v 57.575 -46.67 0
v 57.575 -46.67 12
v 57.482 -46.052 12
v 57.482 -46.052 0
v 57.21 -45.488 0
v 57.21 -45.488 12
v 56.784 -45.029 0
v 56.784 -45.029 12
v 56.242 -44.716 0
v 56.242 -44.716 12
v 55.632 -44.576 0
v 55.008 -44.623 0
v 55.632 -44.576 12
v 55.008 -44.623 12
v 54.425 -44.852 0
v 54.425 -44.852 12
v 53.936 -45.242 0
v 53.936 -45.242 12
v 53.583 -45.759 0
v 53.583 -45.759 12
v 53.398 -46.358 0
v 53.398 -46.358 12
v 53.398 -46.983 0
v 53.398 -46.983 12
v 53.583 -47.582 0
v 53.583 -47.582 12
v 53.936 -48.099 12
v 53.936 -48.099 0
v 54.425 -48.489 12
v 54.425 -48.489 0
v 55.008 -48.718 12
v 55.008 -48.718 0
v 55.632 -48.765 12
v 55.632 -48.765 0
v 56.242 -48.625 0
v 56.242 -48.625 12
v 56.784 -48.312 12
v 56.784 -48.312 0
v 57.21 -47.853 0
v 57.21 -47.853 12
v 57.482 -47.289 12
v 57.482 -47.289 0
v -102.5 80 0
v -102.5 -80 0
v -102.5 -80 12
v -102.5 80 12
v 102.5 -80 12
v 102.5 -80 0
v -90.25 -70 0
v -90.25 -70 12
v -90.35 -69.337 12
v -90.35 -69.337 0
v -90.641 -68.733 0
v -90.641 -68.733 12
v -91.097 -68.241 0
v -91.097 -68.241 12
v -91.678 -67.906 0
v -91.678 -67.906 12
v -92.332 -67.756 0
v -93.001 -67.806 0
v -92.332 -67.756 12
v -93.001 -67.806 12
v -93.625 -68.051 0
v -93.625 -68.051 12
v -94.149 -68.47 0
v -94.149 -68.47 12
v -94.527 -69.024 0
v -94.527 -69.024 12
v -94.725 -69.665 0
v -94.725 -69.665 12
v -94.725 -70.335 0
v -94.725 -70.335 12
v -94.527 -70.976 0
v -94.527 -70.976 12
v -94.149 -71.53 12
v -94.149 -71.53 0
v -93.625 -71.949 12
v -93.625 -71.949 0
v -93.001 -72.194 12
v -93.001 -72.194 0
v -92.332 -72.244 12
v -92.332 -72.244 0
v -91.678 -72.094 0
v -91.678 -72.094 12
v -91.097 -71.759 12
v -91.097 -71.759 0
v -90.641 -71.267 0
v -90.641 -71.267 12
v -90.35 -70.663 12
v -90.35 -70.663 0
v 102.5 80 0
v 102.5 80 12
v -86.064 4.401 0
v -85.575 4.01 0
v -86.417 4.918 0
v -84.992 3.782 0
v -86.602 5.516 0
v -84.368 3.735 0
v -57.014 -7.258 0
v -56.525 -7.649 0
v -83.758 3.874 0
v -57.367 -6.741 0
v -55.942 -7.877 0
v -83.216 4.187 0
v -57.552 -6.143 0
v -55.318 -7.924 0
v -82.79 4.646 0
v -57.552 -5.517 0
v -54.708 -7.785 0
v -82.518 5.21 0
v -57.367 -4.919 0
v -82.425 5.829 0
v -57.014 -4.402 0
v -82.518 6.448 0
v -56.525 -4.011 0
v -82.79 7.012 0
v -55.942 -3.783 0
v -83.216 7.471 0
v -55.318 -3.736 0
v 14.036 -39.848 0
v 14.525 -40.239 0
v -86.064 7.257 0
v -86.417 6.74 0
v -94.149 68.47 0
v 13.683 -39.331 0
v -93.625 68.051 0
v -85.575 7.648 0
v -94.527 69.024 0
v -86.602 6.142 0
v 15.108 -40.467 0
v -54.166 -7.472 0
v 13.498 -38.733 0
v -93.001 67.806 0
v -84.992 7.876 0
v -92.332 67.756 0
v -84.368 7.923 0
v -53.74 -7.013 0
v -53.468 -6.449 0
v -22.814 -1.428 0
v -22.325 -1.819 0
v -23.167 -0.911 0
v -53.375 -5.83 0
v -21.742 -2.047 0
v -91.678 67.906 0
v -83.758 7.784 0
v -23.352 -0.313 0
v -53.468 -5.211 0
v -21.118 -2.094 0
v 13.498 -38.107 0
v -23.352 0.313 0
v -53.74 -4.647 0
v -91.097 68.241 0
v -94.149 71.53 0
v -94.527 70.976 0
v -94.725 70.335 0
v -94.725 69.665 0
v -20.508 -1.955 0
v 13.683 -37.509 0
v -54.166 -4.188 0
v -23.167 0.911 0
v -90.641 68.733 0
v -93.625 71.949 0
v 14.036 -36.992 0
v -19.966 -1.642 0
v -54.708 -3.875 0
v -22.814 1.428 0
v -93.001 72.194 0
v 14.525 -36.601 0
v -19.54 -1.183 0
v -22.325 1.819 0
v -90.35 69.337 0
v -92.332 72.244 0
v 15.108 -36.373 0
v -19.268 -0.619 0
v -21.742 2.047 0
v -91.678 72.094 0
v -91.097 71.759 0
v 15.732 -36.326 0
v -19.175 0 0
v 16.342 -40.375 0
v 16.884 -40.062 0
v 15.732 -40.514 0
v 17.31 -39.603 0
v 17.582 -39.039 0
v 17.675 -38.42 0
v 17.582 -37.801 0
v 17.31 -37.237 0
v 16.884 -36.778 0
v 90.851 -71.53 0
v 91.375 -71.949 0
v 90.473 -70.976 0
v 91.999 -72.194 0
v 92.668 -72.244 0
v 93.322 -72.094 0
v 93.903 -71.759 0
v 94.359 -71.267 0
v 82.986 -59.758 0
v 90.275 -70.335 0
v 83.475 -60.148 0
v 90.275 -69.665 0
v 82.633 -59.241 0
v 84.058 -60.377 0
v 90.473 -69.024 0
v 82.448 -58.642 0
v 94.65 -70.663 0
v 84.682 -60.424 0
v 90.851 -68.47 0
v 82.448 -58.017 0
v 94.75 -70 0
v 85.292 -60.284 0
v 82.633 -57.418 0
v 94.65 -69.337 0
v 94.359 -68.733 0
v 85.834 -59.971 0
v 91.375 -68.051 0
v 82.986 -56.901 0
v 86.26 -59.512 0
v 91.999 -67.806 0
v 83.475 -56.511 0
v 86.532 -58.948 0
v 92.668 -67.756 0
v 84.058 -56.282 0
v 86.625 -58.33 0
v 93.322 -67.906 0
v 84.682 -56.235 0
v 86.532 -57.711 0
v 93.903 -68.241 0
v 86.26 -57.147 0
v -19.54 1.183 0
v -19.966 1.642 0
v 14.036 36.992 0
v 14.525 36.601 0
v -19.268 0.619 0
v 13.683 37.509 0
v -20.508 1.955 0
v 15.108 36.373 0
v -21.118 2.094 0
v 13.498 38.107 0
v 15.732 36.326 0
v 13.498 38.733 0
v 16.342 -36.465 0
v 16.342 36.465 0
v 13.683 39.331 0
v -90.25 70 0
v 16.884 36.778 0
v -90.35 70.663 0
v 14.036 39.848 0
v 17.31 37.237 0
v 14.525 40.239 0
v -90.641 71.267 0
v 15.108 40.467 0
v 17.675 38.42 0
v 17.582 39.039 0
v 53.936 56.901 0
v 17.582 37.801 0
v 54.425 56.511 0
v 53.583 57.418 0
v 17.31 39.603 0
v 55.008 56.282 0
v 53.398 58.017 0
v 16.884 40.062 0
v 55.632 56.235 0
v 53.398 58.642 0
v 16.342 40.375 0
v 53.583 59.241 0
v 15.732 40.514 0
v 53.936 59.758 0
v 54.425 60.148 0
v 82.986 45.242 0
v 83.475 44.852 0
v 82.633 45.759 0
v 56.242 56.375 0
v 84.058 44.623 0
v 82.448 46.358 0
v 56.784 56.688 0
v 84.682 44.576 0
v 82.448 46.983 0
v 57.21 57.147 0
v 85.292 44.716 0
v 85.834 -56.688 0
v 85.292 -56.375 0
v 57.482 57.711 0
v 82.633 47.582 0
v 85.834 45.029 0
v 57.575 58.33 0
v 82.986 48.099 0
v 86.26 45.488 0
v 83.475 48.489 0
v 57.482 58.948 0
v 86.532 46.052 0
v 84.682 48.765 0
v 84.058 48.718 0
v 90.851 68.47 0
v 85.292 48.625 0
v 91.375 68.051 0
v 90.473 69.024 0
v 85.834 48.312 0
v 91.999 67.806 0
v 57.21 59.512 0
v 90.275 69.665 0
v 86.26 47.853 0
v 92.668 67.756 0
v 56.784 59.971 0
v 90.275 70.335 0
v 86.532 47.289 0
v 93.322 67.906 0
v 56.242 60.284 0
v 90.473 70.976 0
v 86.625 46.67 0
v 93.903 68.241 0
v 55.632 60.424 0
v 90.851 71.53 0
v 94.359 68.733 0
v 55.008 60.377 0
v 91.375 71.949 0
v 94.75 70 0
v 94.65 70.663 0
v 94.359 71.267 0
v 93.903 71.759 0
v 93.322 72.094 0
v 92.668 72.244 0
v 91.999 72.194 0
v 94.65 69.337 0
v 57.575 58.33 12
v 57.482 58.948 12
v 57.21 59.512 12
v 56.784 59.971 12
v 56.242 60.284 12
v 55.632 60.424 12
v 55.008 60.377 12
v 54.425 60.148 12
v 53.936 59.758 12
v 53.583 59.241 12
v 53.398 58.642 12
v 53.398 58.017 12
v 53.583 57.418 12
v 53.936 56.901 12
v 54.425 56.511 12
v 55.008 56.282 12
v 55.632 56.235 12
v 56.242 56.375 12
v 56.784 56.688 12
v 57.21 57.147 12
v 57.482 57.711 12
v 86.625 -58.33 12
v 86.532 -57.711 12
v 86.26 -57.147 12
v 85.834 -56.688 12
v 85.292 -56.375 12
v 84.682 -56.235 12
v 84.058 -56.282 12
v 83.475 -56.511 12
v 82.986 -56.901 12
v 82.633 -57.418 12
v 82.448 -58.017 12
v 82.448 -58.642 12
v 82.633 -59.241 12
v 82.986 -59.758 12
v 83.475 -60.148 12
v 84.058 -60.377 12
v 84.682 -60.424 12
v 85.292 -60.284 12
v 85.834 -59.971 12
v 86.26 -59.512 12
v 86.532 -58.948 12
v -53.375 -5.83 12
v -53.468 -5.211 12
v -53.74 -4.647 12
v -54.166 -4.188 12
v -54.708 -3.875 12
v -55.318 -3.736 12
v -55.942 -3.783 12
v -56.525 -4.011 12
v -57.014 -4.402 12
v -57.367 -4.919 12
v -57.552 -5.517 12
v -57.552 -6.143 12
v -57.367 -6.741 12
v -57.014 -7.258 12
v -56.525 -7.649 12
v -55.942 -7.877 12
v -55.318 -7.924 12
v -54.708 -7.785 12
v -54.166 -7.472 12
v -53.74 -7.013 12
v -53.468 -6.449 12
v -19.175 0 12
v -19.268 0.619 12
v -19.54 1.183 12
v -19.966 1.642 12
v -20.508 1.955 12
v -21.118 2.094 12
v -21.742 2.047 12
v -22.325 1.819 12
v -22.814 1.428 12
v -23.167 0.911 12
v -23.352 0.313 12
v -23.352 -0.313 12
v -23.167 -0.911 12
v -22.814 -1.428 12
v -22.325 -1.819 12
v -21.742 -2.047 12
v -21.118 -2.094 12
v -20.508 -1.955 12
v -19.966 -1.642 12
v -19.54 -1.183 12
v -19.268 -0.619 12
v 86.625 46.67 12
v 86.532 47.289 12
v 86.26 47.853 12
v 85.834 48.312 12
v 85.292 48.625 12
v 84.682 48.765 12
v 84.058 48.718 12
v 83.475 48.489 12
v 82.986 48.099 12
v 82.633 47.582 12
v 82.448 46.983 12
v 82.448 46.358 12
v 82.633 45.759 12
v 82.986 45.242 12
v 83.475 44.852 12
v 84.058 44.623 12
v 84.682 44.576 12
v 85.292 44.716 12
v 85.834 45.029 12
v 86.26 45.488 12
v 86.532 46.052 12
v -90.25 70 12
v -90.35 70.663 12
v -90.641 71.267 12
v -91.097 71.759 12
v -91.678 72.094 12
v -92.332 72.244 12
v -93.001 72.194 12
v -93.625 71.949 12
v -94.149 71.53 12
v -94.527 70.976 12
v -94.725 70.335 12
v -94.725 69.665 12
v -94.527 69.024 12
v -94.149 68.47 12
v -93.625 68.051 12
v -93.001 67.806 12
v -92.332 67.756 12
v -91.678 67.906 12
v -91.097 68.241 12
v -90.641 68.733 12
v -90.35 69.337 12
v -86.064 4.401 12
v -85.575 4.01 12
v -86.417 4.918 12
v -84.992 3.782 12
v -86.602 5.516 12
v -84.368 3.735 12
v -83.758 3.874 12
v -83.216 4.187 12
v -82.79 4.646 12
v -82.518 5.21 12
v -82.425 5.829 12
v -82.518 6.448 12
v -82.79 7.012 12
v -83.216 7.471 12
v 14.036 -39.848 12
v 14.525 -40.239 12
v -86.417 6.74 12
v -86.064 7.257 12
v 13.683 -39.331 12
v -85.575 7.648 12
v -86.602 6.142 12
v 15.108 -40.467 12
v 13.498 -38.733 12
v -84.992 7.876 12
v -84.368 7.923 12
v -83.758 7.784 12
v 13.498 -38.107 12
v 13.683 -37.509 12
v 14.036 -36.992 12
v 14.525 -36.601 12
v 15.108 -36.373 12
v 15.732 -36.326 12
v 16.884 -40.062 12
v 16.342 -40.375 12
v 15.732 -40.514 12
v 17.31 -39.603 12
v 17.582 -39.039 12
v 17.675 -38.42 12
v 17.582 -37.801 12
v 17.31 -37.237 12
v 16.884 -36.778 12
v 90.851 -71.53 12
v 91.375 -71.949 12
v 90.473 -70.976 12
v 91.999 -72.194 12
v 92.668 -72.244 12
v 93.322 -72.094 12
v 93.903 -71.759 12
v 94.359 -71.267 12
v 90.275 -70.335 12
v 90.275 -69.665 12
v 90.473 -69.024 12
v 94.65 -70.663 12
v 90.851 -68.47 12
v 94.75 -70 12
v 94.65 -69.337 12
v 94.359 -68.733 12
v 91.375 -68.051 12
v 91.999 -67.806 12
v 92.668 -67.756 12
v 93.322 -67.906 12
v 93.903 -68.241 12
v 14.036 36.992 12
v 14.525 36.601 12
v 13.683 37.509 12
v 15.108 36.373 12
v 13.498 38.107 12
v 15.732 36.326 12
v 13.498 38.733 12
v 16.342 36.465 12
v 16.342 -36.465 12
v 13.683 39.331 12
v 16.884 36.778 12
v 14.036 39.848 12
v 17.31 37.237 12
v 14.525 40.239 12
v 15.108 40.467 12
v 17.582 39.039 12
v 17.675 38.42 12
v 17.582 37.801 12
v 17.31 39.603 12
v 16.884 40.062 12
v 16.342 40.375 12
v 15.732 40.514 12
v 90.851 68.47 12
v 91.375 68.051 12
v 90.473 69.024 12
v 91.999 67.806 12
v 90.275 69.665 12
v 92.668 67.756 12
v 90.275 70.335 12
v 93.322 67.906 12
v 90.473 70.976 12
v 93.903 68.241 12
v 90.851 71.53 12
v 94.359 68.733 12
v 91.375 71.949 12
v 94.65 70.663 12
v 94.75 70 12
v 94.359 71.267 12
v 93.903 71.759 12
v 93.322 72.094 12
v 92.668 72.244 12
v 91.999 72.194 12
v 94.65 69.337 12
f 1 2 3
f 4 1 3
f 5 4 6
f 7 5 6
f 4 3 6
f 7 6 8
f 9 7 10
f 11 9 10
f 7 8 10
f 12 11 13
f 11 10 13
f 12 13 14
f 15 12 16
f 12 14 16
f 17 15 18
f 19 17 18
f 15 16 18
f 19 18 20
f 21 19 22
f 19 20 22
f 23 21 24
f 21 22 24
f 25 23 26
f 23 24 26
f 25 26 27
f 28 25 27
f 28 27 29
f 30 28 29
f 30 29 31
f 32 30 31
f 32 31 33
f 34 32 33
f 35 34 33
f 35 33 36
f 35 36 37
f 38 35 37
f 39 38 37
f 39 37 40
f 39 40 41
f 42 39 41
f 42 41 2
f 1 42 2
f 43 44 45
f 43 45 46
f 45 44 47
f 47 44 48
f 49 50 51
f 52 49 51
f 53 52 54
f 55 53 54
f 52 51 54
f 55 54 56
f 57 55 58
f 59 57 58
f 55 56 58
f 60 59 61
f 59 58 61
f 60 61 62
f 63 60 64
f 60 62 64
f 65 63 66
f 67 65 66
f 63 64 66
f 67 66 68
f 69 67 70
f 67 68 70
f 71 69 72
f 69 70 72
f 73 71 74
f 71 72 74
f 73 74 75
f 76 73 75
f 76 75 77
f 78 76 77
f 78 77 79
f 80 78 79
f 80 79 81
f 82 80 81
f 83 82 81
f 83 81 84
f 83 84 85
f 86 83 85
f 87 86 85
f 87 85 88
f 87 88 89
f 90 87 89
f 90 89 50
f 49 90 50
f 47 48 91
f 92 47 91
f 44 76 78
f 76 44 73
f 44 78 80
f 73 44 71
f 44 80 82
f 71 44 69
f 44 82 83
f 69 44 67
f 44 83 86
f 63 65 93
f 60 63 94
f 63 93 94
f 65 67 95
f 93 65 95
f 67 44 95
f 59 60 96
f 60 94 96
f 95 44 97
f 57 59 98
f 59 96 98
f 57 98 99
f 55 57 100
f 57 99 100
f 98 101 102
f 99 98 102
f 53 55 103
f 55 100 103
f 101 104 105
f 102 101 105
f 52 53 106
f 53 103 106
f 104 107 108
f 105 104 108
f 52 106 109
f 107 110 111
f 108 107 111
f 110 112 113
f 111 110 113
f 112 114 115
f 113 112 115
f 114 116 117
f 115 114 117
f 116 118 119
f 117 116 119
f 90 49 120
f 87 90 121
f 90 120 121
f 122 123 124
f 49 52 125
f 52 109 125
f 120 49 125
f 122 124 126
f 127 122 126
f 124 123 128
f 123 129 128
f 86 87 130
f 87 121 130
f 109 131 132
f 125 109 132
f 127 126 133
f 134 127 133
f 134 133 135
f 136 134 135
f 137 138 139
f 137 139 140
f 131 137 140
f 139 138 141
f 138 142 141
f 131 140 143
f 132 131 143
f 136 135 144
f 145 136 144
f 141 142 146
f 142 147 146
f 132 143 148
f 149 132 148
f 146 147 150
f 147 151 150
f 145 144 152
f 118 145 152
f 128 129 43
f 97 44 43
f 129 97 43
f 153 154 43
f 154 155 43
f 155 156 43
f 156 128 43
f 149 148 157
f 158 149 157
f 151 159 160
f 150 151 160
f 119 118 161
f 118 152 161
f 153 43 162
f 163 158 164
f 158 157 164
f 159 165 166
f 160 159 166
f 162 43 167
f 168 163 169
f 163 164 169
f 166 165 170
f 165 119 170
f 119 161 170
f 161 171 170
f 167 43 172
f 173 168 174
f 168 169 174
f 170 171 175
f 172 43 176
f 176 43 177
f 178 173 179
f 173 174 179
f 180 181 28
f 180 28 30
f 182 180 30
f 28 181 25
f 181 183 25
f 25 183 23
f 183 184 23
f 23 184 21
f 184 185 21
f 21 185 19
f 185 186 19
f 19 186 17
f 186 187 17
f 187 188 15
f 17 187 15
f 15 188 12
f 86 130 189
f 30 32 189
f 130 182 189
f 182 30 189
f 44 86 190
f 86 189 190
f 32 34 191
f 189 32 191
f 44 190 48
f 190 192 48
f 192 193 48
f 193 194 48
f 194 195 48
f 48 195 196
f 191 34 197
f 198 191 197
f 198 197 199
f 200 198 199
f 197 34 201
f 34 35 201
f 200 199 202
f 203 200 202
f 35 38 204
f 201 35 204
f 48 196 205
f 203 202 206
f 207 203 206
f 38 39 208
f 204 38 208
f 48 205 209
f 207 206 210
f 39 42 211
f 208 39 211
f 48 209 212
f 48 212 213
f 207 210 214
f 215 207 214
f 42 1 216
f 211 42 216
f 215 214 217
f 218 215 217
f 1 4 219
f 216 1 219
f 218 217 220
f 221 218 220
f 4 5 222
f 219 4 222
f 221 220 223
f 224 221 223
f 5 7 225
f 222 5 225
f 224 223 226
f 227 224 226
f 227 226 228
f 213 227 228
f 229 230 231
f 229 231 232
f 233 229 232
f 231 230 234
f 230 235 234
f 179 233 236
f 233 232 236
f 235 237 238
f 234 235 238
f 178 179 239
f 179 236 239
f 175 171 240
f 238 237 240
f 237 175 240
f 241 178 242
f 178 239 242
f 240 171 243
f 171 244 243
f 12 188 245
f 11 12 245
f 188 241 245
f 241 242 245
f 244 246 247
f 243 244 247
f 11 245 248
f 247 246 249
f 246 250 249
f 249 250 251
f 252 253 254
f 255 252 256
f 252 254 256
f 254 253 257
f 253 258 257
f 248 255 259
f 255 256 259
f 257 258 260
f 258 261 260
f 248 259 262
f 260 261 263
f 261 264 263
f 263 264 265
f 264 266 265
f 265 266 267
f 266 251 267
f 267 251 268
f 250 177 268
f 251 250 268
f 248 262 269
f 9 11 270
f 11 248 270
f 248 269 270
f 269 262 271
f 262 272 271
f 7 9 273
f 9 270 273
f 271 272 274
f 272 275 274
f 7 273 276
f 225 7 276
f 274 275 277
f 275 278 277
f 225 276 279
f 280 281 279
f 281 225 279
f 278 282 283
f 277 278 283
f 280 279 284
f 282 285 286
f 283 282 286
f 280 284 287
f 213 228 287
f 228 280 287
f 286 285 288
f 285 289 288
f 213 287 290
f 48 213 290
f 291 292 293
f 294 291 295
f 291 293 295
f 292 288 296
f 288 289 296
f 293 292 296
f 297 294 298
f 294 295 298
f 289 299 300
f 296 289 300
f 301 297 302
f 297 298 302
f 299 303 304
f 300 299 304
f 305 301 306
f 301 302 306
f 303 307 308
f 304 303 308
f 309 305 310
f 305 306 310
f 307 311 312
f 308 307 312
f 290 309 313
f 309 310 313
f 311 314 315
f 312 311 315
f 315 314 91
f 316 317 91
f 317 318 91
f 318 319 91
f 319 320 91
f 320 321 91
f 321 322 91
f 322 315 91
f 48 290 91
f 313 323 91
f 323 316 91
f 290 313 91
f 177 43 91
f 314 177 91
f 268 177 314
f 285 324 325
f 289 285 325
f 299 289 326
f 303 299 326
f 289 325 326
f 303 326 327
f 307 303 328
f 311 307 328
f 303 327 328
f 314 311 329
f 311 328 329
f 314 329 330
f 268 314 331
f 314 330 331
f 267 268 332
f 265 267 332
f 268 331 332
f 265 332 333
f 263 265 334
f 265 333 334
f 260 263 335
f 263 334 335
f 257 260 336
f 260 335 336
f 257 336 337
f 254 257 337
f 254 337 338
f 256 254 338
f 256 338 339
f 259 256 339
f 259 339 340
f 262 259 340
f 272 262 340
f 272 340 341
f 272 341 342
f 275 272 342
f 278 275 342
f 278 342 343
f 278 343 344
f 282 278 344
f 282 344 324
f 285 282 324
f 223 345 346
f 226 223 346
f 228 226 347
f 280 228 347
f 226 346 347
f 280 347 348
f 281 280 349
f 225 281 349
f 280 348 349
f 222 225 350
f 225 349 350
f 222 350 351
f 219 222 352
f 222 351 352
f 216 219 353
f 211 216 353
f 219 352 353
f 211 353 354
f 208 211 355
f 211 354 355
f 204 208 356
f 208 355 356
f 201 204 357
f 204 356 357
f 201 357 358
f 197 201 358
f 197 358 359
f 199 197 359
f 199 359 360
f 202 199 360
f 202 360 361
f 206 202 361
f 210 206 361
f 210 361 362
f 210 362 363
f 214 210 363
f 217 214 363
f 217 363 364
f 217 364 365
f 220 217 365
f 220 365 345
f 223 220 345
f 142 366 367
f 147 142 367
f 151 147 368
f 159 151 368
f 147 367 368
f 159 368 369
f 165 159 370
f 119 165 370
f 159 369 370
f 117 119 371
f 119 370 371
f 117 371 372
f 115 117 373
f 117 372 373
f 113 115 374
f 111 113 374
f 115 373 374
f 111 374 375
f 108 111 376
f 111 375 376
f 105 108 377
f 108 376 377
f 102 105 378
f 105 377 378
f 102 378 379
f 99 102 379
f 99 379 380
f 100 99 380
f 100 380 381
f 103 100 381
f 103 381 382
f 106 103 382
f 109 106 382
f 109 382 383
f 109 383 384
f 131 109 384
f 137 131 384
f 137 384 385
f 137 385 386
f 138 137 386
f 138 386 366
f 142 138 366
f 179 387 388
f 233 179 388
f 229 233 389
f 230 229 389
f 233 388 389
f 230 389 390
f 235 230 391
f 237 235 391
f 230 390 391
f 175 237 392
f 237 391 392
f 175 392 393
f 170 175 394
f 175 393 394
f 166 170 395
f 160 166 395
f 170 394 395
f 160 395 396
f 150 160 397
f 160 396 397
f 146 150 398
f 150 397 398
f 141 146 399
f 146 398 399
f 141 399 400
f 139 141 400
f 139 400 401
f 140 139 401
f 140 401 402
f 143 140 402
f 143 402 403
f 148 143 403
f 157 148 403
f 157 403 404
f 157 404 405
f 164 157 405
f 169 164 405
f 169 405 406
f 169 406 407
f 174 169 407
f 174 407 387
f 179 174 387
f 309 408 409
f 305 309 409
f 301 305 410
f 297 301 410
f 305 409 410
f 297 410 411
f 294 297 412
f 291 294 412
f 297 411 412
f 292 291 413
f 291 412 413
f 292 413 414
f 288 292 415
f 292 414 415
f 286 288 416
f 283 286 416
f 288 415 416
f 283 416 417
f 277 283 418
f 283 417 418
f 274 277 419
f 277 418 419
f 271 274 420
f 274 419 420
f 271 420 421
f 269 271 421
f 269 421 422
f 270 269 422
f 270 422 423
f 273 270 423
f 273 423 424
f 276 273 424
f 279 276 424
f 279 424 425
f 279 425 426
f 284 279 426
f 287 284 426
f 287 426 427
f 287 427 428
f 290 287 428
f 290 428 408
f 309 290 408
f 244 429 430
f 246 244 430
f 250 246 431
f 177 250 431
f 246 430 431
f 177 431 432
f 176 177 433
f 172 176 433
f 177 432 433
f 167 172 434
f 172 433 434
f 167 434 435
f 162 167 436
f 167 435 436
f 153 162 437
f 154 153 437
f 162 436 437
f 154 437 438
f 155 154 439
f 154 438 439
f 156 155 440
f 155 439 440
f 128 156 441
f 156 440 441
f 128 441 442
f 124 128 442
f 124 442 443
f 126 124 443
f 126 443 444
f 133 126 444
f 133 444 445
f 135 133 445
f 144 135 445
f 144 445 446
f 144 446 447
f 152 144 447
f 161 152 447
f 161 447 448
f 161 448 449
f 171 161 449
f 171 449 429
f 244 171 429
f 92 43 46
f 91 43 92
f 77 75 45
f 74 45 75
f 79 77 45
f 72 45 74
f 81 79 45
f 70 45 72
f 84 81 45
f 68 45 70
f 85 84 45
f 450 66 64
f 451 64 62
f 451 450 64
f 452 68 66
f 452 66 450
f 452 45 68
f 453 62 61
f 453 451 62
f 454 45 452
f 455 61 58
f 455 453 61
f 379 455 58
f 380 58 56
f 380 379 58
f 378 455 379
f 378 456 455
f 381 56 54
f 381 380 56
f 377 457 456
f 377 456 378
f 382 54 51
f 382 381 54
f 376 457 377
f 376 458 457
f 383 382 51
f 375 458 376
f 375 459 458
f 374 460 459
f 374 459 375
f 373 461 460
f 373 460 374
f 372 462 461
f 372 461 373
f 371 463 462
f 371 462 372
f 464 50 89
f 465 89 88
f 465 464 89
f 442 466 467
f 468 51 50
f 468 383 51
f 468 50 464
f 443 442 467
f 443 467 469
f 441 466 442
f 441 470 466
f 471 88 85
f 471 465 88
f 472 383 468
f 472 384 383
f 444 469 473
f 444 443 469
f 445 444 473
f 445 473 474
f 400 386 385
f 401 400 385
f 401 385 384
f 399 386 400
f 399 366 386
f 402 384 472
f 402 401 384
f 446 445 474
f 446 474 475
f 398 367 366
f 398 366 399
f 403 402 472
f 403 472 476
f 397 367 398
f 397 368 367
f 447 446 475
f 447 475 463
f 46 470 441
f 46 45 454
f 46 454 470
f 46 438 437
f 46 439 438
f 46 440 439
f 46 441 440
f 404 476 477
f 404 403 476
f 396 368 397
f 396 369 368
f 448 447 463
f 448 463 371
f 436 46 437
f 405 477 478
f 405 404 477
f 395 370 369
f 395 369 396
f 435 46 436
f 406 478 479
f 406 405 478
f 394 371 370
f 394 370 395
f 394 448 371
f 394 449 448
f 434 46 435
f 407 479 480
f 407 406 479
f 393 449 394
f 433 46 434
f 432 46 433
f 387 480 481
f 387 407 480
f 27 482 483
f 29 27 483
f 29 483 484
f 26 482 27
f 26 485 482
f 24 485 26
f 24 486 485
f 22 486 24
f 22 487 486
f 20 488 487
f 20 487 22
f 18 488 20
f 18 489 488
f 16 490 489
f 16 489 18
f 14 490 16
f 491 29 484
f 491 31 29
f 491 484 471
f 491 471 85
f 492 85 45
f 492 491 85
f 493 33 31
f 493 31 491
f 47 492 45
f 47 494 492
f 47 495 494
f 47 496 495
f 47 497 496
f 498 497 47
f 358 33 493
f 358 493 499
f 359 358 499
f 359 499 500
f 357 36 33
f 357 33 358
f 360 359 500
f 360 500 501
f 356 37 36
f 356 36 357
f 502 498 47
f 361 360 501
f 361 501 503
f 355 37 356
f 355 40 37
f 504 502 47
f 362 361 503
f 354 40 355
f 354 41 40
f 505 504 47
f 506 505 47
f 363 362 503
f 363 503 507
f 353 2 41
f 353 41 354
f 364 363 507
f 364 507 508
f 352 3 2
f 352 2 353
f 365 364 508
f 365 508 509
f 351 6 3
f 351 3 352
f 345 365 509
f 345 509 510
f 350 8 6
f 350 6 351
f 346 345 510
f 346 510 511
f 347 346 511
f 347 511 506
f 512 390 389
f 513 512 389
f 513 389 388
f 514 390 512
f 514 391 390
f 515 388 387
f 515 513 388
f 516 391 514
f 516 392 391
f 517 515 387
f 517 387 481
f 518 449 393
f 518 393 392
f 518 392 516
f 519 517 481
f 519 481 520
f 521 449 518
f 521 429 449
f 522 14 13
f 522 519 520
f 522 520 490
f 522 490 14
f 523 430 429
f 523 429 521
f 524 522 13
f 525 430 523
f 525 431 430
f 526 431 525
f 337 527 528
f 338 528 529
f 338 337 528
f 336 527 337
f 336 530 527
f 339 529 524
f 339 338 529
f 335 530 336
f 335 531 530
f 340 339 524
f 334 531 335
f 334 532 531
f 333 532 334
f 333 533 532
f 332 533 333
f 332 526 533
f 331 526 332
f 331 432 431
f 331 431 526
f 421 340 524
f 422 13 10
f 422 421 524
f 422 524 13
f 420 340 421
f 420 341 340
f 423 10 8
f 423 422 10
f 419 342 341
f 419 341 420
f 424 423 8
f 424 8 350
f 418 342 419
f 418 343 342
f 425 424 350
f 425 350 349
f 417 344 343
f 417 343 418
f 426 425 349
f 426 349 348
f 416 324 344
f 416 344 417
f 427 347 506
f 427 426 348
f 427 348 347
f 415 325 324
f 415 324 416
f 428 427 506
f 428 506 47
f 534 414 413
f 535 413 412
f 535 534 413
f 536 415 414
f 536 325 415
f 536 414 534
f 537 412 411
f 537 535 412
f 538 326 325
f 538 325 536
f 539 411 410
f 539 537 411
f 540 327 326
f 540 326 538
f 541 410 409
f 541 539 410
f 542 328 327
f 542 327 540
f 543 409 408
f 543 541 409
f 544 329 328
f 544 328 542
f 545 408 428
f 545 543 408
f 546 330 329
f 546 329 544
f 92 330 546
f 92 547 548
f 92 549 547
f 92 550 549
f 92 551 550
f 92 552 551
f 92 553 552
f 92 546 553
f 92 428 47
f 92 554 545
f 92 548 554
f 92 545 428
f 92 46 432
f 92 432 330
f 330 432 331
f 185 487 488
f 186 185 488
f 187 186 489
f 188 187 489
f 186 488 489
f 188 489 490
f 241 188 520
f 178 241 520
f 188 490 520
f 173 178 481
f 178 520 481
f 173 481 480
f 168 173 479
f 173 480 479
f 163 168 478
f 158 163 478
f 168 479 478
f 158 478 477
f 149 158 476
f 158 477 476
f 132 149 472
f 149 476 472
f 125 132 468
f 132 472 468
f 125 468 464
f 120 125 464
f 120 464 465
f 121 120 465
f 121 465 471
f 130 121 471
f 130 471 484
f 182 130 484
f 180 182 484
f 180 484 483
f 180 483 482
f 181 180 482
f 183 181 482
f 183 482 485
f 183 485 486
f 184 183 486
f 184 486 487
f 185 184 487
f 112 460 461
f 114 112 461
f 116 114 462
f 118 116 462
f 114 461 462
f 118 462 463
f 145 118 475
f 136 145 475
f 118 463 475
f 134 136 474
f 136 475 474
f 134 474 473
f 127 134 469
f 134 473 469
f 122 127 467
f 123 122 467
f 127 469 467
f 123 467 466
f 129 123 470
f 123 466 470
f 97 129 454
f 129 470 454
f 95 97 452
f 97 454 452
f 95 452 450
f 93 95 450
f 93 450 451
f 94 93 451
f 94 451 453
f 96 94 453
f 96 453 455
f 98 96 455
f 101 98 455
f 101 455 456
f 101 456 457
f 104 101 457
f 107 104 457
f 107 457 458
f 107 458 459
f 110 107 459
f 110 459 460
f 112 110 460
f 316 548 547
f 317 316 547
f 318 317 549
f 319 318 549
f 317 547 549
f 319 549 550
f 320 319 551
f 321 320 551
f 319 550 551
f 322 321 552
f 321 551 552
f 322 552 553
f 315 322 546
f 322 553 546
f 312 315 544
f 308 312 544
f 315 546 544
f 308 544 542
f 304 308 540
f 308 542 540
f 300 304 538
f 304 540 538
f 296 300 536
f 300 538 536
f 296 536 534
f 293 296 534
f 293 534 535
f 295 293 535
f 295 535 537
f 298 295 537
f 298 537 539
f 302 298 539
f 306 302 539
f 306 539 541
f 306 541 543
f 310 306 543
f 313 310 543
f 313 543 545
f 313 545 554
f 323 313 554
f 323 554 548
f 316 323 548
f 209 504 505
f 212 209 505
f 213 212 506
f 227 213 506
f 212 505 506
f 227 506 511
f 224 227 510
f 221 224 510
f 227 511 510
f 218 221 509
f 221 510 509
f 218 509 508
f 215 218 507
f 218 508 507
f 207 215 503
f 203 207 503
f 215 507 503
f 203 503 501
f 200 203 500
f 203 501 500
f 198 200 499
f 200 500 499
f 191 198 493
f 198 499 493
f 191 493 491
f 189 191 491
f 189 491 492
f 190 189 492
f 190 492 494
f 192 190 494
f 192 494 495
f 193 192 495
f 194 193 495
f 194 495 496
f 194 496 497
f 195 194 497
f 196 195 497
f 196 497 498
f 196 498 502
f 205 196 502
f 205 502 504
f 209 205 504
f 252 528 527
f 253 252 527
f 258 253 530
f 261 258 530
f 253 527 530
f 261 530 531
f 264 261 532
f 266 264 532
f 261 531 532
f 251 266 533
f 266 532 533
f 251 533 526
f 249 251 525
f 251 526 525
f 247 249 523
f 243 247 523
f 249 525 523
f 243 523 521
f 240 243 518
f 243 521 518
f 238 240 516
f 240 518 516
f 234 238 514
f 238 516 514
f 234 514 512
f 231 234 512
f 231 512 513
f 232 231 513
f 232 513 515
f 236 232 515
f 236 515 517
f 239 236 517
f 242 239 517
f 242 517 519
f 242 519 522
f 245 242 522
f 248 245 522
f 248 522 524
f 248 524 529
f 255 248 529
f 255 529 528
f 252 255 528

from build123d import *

# Parameters (mm, degrees)
SKETCH_W        = 205
SKETCH_H        = 160
PAD_DEPTH       = 12
SKETCH001_R     = 2.1
POCKET_DEPTH    = 12.001
SKETCH002_R     = 2.25
POCKET001_DEPTH = 12.001


with BuildPart() as part:
    # Sketch → Pad (new body)
    with BuildSketch(Plane.XY):
        Rectangle(SKETCH_W, SKETCH_H)
    extrude(amount=PAD_DEPTH)

    # Sketch001 → Pocket (cut, through all)
    with BuildSketch(Plane.XY.offset(12)):
        with Locations((-84.525, 5.829)):
            Circle(SKETCH001_R)
        with Locations((-55.475, -5.83)):
            Circle(SKETCH001_R)
        with Locations((-21.275, 0)):
            Circle(SKETCH001_R)
        with Locations((15.575, 38.42)):
            Circle(SKETCH001_R)
        with Locations((15.575, -38.42)):
            Circle(SKETCH001_R)
        with Locations((55.475, 58.3295)):
            Circle(SKETCH001_R)
        with Locations((84.525, 46.6705)):
            Circle(SKETCH001_R)
        with Locations((55.475, -46.6705)):
            Circle(SKETCH001_R)
        with Locations((84.525, -58.3295)):
            Circle(SKETCH001_R)
    extrude(amount=-POCKET_DEPTH, mode=Mode.SUBTRACT)

    # Sketch002 → Pocket001 (cut, through all)
    with BuildSketch(Plane.XY.offset(12)):
        with Locations((-92.5, 70)):
            Circle(SKETCH002_R)
        with Locations((92.5, 70)):
            Circle(SKETCH002_R)
        with Locations((-92.5, -70)):
            Circle(SKETCH002_R)
        with Locations((92.5, -70)):
            Circle(SKETCH002_R)
    extrude(amount=-POCKET001_DEPTH, mode=Mode.SUBTRACT)


solid = part.part
